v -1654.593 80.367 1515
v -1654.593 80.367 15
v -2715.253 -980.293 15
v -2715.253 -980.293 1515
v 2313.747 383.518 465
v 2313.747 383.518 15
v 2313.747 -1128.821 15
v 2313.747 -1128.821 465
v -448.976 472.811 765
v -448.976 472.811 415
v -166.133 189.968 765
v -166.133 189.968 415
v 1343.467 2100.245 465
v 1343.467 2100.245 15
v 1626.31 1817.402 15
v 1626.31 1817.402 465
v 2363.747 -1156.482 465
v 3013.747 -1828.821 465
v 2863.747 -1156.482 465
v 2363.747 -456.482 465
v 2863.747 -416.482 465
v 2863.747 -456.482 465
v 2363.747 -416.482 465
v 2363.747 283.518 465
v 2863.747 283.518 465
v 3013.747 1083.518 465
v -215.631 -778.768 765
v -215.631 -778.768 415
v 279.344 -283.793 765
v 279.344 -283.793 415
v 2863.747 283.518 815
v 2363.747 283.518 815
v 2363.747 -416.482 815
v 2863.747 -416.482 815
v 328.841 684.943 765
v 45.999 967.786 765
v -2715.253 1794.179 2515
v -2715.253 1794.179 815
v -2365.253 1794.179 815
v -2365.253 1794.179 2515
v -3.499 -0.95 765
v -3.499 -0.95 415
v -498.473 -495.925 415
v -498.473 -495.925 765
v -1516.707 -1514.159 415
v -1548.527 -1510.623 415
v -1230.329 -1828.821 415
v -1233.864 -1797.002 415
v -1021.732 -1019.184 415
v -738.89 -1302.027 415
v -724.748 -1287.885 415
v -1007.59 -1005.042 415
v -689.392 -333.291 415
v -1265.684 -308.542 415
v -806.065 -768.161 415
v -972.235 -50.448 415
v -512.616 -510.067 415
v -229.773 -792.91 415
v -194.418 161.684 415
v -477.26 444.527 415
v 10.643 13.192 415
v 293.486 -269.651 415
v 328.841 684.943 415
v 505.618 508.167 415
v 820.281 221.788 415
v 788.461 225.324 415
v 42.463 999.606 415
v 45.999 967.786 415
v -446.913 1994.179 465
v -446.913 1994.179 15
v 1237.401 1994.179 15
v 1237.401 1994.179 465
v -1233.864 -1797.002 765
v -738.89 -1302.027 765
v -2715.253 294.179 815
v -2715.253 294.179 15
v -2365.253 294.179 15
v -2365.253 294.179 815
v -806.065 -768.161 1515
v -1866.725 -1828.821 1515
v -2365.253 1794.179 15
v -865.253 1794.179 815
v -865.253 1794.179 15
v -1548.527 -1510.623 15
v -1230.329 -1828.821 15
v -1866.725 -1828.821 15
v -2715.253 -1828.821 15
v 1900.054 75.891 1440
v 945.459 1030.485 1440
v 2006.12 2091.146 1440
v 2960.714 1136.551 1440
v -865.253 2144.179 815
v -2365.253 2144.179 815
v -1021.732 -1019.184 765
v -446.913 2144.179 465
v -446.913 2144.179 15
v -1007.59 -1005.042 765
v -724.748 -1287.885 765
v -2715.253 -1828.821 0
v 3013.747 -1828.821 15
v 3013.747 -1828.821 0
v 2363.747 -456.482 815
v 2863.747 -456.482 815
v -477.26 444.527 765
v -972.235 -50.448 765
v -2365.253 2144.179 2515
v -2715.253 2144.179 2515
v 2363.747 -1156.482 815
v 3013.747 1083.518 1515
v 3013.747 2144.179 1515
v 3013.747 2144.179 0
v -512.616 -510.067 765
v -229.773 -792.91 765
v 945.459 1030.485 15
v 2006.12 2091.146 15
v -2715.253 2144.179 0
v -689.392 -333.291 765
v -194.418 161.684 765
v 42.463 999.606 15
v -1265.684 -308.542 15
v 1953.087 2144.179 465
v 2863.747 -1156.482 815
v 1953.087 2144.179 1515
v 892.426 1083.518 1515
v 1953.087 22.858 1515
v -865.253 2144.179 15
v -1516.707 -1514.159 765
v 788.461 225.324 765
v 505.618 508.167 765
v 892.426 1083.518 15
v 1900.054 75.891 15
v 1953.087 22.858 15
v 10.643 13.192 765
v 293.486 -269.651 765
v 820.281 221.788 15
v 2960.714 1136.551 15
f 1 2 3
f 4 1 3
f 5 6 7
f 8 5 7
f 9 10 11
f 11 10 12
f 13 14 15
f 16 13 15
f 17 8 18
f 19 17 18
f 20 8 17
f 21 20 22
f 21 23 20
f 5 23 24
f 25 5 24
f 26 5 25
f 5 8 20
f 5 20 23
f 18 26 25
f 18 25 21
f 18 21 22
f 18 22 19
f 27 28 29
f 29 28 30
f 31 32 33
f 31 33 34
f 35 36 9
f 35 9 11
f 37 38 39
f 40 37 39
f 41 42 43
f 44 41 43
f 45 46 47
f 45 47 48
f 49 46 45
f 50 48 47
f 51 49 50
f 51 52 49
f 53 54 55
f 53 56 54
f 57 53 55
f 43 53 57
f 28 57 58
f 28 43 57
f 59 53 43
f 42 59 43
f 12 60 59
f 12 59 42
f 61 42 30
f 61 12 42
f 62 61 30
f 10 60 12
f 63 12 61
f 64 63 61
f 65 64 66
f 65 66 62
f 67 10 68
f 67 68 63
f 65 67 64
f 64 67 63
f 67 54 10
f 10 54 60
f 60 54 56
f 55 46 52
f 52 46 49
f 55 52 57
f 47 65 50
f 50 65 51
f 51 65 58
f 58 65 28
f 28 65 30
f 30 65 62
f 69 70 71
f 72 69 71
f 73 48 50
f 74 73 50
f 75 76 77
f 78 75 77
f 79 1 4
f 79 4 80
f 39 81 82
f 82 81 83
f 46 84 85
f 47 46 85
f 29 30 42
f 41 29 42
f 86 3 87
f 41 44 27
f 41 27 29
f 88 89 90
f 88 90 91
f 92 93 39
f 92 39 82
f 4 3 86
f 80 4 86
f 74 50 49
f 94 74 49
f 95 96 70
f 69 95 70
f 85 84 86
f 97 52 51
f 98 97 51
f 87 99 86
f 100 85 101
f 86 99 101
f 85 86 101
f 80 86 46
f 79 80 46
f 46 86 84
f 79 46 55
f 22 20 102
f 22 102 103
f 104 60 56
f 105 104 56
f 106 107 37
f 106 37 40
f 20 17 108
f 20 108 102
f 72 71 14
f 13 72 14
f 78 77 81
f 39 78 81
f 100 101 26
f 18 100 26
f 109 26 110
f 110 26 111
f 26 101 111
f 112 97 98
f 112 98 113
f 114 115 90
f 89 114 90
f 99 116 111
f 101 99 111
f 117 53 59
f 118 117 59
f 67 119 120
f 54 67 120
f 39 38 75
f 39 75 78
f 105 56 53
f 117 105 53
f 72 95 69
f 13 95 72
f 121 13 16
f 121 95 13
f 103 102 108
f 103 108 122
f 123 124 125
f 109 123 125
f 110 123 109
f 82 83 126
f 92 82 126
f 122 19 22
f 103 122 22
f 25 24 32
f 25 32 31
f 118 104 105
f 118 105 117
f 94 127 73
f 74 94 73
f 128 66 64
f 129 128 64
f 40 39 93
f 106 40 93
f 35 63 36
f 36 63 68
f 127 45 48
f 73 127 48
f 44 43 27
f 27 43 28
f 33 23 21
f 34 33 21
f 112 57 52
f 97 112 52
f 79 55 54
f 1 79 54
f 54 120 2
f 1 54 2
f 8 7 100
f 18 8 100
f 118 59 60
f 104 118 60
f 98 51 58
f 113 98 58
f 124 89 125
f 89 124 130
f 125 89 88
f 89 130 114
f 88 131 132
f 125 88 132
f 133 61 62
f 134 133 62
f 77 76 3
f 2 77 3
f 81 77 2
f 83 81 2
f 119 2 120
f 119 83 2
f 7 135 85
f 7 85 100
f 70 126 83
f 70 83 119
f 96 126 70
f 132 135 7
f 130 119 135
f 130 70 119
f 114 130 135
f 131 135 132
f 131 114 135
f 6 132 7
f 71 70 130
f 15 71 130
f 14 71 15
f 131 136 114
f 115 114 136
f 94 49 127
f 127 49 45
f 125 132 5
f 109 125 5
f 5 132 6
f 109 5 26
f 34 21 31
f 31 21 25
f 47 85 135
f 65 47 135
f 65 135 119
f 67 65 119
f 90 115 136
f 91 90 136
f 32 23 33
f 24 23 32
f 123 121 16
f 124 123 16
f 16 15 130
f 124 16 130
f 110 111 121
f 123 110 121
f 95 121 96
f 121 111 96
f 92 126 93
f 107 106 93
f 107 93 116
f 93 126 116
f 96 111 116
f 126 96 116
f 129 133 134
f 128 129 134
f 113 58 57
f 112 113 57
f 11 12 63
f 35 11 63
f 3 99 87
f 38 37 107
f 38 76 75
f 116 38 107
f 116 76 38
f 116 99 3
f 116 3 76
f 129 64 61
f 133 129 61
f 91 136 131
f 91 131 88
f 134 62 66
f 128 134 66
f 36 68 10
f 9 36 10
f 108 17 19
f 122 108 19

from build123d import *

# Parameters (mm, degrees)
F0_W      = 5729
F0_H      = 3973
F1_DEPTH  = 15
F3_W      = 350
F3_H      = 350
F4_DEPTH  = 2500
F5_DEPTH  = 1500
F6_W      = 1500
F6_H      = 350
F6_W_2    = 350
F6_H_2    = 1500
F7_DEPTH  = 800
F9_DEPTH  = 450
F11_DEPTH = 400
F13_DEPTH = 350
F14_W     = 500
F14_H     = 700
F15_DEPTH = 350
F16_W     = 1350
F16_H     = 1425
F17_DEPTH = 1500


with BuildPart() as f1:
    # F0 (on Top) → F1 (new body)
    with BuildSketch(Plane.XY):
        with Locations((149.2468051165, 157.678600383)):
            Rectangle(F0_W, F0_H)
    extrude(amount=F1_DEPTH)

    # F3 (on face) → F4 (join)
    with BuildSketch(Plane.XY.offset(15)):
        with Locations((-2540.2531948835, 1969.178600383)):
            Rectangle(F3_W, F3_H)
    extrude(amount=F4_DEPTH)

    # F2 (on face) → F5 (join)
    with BuildSketch(Plane.XY.offset(15)):
        Polygon((-1654.5930231036, 80.3669095867), (-2715.2531948835, -980.2932621931), (-1866.7250574596, -1828.821399617), (-806.0648856798, -768.1612278371), align=None)
        Polygon((3013.7468051165, 2144.178600383), (1953.0866333367, 2144.178600383), (892.4264615569, 1083.5184286032), (1953.0866333367, 22.8582568234), (3013.7468051165, 1083.5184286032), align=None)
    extrude(amount=F5_DEPTH)

    # F6 (on face) → F7 (join)
    with BuildSketch(Plane.XY.offset(15)):
        with Locations((-1615.2531948835, 1969.178600383)):
            Rectangle(F6_W, F6_H)
        with Locations((-2540.2531948835, 1044.178600383)):
            Rectangle(F6_W_2, F6_H_2)
    extrude(amount=F7_DEPTH)

    # F8 (on face) → F9 (join)
    with BuildSketch(Plane.XY.offset(15)):
        Polygon((1626.3099380401, 1817.4019050864), (1953.0866333367, 2144.178600383), (-446.9133666633, 2144.178600383), (-446.9133666633, 1994.178600383), (1237.4012083875, 1994.178600383), (1343.4672255655, 2100.244617561), align=None)
        Polygon((3013.7468051165, 1083.5184286032), (2313.7468051165, 383.5184286032), (2313.7468051165, -1128.821399617), (3013.7468051165, -1828.821399617), align=None)
    extrude(amount=F9_DEPTH)

    # F10 (on face) → F11 (join)
    with BuildSketch(Plane.XY.offset(15)):
        Polygon((820.2807110493, 221.788265824), (42.4632517441, 999.6057251292), (-1265.684293451, -308.5418200659), (-806.0648856798, -768.1612278371), (-1548.5270059257, -1510.623348083), (-1230.3289543917, -1828.821399617), align=None)
    extrude(amount=F11_DEPTH)

    # F12 (on face) → F13 (join)
    with BuildSketch(Plane.XY.offset(415)):
        Polygon((-1021.7324539417, -1019.1841351584), (-1516.7072007723, -1514.1588819889), (-1233.8644882976, -1797.0015944636), (-738.8897414671, -1302.026847633), align=None)
        Polygon((-512.6155955462, -510.0672286452), (-1007.5903423768, -1005.0419754758), (-724.7476299021, -1287.8846879504), (-229.7728830716, -792.9099411198), align=None)
        Polygon((-3.4987371507, -0.9503221321), (-498.4734839813, -495.9250689627), (-215.6307715066, -778.7677814373), (279.3439753239, -283.7930346067), align=None)
        Polygon((-477.260232428, 444.5269018978), (-972.2349792586, -50.4478449328), (-689.392266784, -333.2905574074), (-194.4175199534, 161.6841894232), align=None)
        Polygon((45.99878565, 967.7859199758), (-448.9759611806, 472.8111731453), (-166.133248706, 189.9684606706), (328.8414981246, 684.9432075012), align=None)
        Polygon((505.6181934213, 508.1665122046), (10.6434465907, 13.191765374), (293.4861590653, -269.6509471006), (788.4609058959, 225.32379973), align=None)
    extrude(amount=F13_DEPTH)

    # F14 (on face) → F15 (join)
    with BuildSketch(Plane.XY.offset(465)):
        with Locations((2613.7468051165, -66.4815713968)):
            Rectangle(F14_W, F14_H)
        with Locations((2613.7468051165, -806.4815713968)):
            Rectangle(F14_W, F14_H)
    extrude(amount=F15_DEPTH)

    # F16 (on face) → F17 (cut, through all)
    with BuildSketch(Plane(origin=(987.9724450801, 987.9724450801, 0), x_dir=(0.7071067812, -0.7071067812, 0), z_dir=(-0.7071067812, -0.7071067812, 0))):
        with Locations((614.8775742713, 727.5)):
            Rectangle(F16_W, F16_H)
    extrude(amount=-F17_DEPTH, mode=Mode.SUBTRACT)


solid = f1.part
